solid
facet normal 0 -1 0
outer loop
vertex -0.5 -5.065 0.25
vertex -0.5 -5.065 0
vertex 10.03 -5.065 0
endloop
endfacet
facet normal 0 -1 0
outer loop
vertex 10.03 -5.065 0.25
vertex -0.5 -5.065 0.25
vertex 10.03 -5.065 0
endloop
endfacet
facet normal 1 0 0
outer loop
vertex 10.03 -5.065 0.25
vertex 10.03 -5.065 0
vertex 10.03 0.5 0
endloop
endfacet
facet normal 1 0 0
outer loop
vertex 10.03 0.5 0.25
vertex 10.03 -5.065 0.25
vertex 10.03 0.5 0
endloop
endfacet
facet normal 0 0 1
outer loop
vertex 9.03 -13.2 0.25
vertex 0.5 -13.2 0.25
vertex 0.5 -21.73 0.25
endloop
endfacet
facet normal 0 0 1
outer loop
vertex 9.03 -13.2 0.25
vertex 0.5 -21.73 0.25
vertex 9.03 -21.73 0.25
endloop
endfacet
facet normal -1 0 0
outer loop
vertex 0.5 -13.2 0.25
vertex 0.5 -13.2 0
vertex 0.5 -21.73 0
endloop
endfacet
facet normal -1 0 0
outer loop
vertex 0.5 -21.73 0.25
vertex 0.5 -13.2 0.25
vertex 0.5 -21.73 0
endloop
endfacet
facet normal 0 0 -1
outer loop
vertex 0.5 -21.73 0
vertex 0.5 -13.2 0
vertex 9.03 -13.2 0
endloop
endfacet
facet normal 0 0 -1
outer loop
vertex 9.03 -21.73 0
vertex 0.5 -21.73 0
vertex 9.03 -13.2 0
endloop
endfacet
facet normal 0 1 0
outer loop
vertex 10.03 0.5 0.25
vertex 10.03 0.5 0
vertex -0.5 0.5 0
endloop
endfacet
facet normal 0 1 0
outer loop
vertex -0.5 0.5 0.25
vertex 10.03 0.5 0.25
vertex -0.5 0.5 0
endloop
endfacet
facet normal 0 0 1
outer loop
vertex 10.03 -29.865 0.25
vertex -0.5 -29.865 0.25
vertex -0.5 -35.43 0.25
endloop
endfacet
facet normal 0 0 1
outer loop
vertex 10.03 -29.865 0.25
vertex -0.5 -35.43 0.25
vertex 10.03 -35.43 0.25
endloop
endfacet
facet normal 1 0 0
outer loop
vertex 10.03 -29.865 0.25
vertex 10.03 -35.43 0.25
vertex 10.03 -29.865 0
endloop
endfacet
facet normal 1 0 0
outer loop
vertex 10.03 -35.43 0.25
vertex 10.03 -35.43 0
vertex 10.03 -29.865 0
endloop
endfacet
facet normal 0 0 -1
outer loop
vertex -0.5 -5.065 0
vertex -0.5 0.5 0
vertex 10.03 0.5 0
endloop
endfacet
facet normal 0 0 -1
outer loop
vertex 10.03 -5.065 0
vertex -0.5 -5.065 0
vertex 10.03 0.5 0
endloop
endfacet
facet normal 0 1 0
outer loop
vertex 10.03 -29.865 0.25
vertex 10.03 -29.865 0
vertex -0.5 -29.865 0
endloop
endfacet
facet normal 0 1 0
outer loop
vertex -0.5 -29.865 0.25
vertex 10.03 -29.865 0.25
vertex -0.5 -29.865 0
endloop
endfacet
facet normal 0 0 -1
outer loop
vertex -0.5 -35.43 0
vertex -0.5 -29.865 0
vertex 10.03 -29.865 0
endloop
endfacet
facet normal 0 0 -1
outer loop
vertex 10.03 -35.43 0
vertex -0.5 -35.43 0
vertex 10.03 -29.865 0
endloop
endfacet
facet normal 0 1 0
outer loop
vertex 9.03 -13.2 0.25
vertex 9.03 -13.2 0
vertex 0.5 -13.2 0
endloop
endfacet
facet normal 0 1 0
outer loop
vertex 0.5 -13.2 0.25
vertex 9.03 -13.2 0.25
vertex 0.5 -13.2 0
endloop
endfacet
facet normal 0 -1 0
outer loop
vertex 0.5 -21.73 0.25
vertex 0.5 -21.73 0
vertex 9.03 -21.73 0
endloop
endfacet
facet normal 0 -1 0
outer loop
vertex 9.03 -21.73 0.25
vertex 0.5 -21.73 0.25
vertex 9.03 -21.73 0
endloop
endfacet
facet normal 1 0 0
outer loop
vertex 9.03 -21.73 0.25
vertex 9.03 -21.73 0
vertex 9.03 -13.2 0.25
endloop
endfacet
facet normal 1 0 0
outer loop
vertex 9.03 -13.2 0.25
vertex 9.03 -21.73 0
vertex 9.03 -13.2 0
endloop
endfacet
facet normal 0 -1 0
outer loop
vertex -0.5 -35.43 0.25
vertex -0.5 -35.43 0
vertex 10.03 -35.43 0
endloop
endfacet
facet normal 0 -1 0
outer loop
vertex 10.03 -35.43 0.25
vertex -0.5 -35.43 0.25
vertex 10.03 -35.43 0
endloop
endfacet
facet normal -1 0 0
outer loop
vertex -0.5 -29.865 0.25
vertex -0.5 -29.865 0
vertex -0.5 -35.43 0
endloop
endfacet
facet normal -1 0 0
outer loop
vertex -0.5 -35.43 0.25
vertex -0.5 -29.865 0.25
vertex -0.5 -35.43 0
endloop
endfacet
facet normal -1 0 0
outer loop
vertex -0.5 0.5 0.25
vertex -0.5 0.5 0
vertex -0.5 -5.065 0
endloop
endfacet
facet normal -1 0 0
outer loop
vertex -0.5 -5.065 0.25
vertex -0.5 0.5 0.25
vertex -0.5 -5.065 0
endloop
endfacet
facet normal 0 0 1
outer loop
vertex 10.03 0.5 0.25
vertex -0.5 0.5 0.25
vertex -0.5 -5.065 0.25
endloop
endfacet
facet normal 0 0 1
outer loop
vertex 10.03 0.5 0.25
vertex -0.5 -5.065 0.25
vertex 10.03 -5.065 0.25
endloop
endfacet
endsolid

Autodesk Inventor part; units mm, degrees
ref_plane "YZ Plane" through (0, 0, 0) normal (1, 0, 0) x (0, 1, 0)
ref_plane "XZ Plane" through (0, 0, 0) normal (0, 1, 0) x (-1, 0, 0)
ref_plane "XY Plane" through (0, 0, 0) normal (0, 0, 1) x (1, 0, 0)
sketch "Sketch1" plane through (0, 0, 0) normal (0, 0, 1) x (1, 0, 0)
  line L0 (0, 0) -> (0, -4.565) projected
  line L1 (0, -4.565) -> (9.53, -4.565) projected
  line L2 (9.53, 0) -> (9.53, -4.565) projected
  line L3 (0, 0) -> (9.53, 0) projected
  line L4 (0, -12.7) -> (0, -22.23) projected
  line L5 (0, -22.23) -> (9.53, -22.23) projected
  line L6 (9.53, -12.7) -> (9.53, -22.23) projected
  line L7 (0, -12.7) -> (9.53, -12.7) projected
  line L8 (0, -30.365) -> (0, -34.93) projected
  line L9 (0, -34.93) -> (9.53, -34.93) projected
  line L10 (9.53, -30.365) -> (9.53, -34.93) projected
  line L11 (0, -30.365) -> (9.53, -30.365) projected
  line L12 (10.03, 0.5) -> (-0.5, 0.5)
  line L13 (-0.5, 0.5) -> (-0.5, -5.065)
  line L14 (-0.5, -5.065) -> (10.03, -5.065)
  line L15 (10.03, -5.065) -> (10.03, 0.5)
  line L16 (9.03, -13.2) -> (0.5, -13.2)
  line L17 (0.5, -13.2) -> (0.5, -21.73)
  line L18 (0.5, -21.73) -> (9.03, -21.73)
  line L19 (9.03, -21.73) -> (9.03, -13.2)
  line L20 (10.03, -29.865) -> (-0.5, -29.865)
  line L21 (-0.5, -29.865) -> (-0.5, -35.43)
  line L22 (-0.5, -35.43) -> (10.03, -35.43)
  line L23 (10.03, -35.43) -> (10.03, -29.865)
  dimension "d0" = 0.5
  dimension "d1" = 0.5
  dimension "d2" = 0.5
  dimension "d3" = 0.5
  dimension "d4" = 0.5
  dimension "d5" = 0.5
  dimension "d6" = 0.5
  dimension "d7" = 0.5
  dimension "d8" = 0.5
  dimension "d9" = 0.5
extrude "Extrusion1" add sketch "Sketch1" along normal blind 0.25 contours L3 L2 L1 L0 | L11 L10 L9 L8 | L15 L14 L13 L12 | L19 L18 L17 L16 | L23 L22 L21 L20
equation "\"d1\" = d0"
equation "\"d2\" = d0"
equation "\"d3\" = d0"
equation "\"d4\" = d0"
equation "\"d5\" = d0"
equation "\"d6\" = d0"
equation "\"d7\" = d0"
equation "\"d8\" = d0"
equation "\"d9\" = d0"
properties part number "leakage" material "Polypropylene"
